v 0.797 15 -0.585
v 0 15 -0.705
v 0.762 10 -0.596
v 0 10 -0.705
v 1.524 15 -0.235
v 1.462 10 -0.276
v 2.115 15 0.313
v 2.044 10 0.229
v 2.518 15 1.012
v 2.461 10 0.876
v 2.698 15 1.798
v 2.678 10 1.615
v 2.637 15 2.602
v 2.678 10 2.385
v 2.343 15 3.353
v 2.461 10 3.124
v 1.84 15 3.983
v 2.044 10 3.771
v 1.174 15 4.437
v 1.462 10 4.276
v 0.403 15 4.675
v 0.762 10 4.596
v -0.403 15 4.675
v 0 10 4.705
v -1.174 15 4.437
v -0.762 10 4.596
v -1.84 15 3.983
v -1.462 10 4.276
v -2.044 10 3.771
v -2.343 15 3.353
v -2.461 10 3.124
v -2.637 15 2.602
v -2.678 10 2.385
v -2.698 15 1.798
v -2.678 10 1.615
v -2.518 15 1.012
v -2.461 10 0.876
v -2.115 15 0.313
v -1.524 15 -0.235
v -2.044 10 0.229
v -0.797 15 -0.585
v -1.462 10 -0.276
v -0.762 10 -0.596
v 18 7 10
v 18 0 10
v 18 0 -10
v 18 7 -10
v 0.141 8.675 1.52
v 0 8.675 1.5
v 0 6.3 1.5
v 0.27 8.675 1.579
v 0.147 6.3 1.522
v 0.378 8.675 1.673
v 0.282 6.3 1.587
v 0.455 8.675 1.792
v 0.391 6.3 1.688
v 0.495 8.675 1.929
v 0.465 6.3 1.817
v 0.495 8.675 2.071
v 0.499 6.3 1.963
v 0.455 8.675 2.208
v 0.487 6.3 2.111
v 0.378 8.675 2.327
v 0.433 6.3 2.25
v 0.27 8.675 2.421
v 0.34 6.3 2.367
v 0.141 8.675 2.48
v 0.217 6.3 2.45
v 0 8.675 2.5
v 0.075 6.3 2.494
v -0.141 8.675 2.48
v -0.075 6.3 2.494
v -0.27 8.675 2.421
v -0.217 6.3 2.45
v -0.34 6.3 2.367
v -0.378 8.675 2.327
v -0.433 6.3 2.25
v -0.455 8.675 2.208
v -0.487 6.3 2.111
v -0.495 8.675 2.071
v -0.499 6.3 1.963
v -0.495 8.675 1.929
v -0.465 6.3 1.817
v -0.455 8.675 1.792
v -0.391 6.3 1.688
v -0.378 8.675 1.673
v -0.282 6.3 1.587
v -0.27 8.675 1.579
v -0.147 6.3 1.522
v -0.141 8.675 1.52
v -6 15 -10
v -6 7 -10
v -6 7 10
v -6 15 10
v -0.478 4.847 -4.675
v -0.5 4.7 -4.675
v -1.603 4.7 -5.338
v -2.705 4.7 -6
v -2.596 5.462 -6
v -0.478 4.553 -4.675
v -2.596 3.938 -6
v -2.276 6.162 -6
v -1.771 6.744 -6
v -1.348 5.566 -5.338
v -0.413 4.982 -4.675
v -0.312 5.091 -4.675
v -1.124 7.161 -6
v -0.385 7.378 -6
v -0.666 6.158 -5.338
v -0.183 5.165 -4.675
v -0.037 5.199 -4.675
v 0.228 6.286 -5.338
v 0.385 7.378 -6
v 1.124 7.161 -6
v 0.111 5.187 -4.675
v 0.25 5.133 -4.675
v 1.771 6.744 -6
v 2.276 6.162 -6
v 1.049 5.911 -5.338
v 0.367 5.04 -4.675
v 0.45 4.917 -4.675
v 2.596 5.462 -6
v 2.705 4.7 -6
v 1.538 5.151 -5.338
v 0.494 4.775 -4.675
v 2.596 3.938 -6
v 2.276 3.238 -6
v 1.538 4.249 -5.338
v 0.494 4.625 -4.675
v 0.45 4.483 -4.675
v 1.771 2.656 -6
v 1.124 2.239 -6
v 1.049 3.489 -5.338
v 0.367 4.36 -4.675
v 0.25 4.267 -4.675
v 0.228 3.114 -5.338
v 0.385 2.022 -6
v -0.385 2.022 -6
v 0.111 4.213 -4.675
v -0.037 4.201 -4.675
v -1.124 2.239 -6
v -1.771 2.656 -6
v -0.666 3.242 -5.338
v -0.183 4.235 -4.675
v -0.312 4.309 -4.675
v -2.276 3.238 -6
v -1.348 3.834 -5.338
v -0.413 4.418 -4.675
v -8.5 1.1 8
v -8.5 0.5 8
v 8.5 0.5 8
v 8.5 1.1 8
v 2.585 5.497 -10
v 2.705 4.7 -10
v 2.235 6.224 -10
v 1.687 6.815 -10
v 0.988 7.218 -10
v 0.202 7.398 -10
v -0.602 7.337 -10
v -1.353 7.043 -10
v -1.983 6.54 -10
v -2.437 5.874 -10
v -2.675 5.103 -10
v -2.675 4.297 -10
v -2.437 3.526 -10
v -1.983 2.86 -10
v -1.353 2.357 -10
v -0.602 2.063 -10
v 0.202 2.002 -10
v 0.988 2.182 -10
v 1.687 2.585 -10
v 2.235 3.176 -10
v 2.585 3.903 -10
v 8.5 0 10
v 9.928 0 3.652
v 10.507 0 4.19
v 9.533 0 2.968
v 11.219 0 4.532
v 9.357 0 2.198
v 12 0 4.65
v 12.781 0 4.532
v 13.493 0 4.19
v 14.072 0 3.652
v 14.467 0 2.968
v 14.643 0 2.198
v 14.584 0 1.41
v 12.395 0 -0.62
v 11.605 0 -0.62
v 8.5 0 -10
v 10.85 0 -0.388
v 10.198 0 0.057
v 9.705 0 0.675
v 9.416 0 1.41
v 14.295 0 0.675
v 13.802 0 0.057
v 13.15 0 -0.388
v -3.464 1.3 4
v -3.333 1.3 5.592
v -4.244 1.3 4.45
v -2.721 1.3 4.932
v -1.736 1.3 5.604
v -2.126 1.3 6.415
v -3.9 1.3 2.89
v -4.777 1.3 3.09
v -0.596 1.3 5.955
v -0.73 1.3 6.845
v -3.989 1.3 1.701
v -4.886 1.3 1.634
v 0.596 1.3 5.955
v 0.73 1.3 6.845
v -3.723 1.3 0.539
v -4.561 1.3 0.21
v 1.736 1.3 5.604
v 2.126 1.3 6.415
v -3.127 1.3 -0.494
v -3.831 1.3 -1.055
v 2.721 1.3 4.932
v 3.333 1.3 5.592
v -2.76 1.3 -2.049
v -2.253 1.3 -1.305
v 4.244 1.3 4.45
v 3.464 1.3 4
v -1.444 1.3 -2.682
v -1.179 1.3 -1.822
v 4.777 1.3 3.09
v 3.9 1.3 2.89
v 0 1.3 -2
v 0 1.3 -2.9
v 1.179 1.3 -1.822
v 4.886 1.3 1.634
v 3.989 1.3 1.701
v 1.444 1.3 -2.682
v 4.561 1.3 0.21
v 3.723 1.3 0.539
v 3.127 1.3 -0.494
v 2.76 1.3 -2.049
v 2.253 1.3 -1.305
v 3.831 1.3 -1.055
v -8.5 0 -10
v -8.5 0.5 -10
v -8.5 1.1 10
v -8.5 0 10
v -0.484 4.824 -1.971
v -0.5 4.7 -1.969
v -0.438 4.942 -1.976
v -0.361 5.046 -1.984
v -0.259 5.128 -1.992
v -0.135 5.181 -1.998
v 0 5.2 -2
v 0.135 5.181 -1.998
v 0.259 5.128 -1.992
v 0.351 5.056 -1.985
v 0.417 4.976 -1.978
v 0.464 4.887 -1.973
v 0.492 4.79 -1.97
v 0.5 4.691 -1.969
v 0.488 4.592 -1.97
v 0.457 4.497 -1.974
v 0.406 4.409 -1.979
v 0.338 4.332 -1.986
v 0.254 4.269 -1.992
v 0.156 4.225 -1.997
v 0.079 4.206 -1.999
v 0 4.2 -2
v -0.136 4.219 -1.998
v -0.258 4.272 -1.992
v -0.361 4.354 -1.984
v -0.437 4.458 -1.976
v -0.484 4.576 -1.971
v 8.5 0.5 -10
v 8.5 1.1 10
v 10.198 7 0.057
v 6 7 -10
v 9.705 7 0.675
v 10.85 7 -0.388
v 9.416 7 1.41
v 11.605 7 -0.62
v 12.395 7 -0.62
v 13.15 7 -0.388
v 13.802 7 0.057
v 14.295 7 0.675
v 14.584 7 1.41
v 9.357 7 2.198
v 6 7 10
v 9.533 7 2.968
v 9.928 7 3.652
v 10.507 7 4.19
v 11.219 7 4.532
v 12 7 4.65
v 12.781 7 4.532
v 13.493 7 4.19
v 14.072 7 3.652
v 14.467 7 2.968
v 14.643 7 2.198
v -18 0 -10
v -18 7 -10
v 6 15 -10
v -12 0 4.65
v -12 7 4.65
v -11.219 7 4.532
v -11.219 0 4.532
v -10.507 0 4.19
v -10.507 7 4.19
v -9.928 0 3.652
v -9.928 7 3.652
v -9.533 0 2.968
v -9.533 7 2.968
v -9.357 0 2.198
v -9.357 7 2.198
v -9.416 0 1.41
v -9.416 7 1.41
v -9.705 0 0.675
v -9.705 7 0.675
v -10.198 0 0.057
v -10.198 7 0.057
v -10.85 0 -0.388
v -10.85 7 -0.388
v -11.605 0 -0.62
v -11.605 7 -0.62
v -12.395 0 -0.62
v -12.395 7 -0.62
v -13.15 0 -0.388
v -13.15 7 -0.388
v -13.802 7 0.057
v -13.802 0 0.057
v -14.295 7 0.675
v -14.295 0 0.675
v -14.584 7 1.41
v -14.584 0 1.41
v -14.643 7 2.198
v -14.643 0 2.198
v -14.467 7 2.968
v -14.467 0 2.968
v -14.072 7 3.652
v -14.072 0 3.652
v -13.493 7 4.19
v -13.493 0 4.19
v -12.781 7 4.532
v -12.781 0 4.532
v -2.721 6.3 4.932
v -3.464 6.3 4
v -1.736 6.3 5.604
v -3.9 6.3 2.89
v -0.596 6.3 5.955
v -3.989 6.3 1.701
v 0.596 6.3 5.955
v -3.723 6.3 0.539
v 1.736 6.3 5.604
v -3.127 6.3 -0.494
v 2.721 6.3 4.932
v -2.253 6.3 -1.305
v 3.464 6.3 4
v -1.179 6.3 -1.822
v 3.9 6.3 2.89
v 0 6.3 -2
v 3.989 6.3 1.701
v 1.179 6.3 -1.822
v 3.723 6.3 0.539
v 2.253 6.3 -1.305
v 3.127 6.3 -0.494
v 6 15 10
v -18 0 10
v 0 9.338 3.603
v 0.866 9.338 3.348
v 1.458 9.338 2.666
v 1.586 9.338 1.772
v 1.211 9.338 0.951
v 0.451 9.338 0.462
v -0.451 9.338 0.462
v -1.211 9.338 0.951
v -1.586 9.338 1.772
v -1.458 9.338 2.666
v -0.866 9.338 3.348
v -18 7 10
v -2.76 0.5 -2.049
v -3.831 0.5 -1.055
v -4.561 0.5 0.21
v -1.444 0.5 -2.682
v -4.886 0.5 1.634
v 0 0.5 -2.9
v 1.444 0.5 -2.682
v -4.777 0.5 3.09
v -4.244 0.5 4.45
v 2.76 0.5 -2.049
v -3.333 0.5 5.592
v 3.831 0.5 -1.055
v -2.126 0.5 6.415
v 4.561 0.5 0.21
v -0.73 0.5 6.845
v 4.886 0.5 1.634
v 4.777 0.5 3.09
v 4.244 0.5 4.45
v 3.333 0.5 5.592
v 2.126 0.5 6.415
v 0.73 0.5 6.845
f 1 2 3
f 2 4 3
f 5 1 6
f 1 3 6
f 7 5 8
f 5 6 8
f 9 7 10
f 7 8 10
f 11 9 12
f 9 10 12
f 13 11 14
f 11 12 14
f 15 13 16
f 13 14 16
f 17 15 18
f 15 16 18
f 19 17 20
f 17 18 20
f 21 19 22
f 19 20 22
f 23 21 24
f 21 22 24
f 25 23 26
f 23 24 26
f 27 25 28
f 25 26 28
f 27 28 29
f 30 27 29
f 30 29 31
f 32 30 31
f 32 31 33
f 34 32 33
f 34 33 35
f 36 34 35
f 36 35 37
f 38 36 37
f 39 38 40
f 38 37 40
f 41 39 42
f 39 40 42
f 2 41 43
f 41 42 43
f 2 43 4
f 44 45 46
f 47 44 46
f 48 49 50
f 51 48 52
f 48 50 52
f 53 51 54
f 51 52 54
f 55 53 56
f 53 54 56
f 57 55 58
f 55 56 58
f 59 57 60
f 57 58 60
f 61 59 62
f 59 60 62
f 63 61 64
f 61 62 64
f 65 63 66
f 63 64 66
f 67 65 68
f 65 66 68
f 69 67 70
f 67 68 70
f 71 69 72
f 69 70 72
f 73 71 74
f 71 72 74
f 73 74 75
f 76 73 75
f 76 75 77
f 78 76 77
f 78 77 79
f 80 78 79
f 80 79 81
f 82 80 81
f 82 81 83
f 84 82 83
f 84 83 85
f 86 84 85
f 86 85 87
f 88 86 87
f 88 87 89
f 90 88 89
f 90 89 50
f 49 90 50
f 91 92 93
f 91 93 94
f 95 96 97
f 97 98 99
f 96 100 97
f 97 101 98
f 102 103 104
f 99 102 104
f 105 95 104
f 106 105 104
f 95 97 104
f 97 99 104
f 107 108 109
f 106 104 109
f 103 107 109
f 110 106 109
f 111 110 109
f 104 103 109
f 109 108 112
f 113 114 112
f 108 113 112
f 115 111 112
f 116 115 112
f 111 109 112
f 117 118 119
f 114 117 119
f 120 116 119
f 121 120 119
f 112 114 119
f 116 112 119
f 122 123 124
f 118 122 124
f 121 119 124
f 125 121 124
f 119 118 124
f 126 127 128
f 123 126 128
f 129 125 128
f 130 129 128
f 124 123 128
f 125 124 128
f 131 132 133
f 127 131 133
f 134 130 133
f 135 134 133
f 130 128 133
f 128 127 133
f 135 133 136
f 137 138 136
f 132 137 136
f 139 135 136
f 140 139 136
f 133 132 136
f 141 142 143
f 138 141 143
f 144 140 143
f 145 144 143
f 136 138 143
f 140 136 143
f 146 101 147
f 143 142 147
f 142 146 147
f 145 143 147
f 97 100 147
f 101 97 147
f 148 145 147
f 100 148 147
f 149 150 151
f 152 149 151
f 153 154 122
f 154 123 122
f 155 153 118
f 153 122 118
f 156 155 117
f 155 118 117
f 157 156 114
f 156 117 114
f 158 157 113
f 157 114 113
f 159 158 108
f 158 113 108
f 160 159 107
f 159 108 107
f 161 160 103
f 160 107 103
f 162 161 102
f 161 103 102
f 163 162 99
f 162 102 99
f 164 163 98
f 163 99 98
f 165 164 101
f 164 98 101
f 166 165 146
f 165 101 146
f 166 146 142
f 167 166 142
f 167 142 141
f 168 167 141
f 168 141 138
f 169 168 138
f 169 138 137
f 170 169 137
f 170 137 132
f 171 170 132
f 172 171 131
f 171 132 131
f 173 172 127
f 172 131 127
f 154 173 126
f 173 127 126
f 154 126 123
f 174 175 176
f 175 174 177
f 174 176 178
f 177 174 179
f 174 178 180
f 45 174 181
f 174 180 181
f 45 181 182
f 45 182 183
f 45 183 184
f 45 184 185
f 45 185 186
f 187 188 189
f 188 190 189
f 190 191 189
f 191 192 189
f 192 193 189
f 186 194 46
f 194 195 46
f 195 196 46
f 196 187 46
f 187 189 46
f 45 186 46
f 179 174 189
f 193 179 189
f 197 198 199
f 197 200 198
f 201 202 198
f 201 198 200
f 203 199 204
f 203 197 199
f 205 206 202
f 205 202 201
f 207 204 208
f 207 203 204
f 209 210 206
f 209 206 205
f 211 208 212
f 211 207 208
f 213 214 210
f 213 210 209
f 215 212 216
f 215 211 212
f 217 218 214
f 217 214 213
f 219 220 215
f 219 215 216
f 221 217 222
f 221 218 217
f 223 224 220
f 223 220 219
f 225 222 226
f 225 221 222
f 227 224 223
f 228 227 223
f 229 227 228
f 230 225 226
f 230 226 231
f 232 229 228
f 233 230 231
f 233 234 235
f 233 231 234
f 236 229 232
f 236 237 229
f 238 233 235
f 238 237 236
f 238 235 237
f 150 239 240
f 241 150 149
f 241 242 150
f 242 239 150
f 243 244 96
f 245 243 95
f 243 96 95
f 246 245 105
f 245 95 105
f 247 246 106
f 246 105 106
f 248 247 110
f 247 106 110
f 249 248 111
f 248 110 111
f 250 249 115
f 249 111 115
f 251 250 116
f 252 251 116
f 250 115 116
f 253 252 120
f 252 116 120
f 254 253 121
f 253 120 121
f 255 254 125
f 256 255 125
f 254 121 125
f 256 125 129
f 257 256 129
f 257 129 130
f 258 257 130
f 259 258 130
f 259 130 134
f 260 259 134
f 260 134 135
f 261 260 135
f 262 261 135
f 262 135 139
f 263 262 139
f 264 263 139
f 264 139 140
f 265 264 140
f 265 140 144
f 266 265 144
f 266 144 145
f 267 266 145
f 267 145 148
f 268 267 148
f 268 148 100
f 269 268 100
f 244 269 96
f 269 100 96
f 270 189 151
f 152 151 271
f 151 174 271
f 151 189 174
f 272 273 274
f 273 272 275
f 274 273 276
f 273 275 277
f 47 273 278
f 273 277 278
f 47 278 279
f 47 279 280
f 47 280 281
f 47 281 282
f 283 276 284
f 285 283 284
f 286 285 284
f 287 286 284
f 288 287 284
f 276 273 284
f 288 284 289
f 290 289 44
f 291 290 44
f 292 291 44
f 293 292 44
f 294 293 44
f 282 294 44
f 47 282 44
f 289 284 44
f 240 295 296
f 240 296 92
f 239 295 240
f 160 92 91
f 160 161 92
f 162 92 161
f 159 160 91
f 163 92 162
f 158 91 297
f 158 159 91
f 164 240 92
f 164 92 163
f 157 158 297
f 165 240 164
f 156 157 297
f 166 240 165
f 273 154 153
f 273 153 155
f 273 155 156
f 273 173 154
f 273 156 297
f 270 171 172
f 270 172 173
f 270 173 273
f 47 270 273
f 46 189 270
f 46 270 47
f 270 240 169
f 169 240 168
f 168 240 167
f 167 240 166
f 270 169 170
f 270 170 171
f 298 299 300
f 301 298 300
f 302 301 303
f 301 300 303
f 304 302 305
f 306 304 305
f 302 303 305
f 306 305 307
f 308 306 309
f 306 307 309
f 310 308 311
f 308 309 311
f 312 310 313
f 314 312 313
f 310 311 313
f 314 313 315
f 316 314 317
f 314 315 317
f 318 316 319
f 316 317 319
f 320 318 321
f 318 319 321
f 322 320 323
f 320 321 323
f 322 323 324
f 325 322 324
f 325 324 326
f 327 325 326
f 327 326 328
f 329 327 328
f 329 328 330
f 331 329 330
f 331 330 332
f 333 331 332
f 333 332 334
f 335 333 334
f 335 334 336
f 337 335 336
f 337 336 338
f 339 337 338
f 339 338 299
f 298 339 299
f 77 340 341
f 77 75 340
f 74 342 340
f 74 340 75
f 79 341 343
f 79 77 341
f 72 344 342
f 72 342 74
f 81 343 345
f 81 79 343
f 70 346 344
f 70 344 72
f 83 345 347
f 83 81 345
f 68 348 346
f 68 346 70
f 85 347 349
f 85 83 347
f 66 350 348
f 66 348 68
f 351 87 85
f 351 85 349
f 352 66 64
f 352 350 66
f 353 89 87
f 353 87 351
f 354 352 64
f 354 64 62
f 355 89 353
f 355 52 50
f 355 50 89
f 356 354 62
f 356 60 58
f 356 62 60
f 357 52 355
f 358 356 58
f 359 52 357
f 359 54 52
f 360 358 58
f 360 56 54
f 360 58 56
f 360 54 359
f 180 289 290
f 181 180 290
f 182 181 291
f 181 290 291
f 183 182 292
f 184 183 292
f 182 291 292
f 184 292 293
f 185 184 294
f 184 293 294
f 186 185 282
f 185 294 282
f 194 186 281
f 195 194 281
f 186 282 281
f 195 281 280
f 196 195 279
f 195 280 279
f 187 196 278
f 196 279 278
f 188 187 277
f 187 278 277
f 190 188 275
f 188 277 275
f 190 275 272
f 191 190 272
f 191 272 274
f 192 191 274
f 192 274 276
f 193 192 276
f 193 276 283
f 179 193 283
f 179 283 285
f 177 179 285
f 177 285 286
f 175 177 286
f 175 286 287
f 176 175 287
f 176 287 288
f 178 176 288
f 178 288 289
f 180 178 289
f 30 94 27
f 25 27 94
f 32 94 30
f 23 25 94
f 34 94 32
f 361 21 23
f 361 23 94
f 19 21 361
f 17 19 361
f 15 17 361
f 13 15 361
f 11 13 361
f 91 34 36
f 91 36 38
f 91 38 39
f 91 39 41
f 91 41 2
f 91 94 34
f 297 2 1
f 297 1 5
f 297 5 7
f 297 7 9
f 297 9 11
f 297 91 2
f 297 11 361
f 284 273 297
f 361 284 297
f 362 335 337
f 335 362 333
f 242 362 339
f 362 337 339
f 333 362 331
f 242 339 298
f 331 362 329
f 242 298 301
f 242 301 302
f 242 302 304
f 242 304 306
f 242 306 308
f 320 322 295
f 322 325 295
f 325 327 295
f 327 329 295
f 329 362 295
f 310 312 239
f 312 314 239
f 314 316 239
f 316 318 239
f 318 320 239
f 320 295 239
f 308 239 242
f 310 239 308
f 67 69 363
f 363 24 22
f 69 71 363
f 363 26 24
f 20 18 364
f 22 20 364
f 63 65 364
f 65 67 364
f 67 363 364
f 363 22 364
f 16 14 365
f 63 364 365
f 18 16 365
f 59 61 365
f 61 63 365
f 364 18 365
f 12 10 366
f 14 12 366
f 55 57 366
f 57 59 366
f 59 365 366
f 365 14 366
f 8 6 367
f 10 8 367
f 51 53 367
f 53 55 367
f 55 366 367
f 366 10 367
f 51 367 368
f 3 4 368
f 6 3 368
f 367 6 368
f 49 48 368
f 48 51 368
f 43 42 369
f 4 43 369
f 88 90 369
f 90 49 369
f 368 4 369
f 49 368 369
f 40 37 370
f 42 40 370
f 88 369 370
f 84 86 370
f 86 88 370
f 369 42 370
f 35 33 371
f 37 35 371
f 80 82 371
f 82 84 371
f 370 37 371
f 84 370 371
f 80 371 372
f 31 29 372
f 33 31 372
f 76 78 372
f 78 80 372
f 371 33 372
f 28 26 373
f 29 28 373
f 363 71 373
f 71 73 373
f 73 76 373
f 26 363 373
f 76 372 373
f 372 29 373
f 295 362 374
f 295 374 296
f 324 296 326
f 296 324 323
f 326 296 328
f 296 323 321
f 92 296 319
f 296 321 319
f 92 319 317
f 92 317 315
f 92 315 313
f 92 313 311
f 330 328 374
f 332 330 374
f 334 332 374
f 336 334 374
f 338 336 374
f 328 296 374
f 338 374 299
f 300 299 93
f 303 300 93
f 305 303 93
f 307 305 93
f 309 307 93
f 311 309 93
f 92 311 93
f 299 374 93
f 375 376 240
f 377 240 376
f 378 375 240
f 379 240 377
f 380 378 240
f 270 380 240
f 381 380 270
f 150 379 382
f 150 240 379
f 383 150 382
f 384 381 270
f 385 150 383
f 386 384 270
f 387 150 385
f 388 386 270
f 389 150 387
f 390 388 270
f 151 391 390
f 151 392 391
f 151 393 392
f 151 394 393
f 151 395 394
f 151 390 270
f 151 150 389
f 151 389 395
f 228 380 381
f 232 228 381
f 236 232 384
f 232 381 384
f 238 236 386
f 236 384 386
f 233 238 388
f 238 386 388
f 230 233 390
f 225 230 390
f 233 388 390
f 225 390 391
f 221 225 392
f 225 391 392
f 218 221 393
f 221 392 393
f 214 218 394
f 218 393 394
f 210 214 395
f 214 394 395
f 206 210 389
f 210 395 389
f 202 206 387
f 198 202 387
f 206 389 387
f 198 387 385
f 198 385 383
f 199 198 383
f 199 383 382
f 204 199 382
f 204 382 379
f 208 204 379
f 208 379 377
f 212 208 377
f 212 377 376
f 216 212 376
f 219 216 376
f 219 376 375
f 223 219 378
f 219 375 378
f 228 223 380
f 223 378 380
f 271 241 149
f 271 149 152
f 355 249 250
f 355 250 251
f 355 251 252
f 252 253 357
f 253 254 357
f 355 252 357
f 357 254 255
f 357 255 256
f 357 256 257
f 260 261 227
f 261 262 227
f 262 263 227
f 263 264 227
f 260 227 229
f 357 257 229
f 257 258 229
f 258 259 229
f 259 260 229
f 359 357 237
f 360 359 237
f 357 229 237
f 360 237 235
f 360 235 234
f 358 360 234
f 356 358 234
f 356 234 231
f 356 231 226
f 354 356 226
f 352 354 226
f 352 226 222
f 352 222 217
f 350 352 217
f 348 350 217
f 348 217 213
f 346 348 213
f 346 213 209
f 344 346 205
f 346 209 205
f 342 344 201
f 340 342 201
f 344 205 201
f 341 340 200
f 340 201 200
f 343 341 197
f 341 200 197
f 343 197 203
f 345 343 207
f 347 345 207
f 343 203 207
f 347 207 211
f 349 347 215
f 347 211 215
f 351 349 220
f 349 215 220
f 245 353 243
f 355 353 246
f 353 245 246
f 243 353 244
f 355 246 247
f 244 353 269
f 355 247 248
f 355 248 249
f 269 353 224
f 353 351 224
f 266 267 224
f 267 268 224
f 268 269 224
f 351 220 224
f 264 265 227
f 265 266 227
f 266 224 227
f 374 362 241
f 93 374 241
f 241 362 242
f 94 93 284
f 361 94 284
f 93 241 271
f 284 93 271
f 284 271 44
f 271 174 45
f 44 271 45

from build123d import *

# Parameters (mm, degrees)
SKETCH_1_W                 = 36
SKETCH_1_H                 = 20
EXTRUDE_1_DEPTH            = 15
SKETCH_2_R                 = 2.65
CUT_EXTRUDE_1_DEPTH        = 26.475478406
SKETCH_3_W                 = 12
SKETCH_3_H                 = 8
CUT_EXTRUDE_2_DEPTH        = 31.805843601
SKETCH_5_W                 = 17
SKETCH_5_H                 = 0.5
CUT_EXTRUDE_3_DEPTH        = 31.805843601
SKETCH_6_W                 = 17
SKETCH_6_H                 = 2
CUT_EXTRUDE_4_DEPTH        = 0.6
SKETCH_7_R                 = 4.9
CUT_EXTRUDE_5_DEPTH        = 0.8
SKETCH_8_R                 = 4
CUT_EXTRUDE_6_DEPTH        = 5
HOLE_WIZARD_1_4_28_1_D     = 5.4102
HOLE_WIZARD_1_4_28_1_DEPTH = 5
HOLE_WIZARD_1_4_28_1_TIP   = 1.625388061
SKETCH_11_R                = 0.5
CUT_EXTRUDE_7_DEPTH        = 23.35374689
HOLE_WIZARD_1_4_28_3_D     = 5.4102
HOLE_WIZARD_1_4_28_3_DEPTH = 4
HOLE_WIZARD_1_4_28_3_TIP   = 1.625388061
SKETCH_16_R                = 0.5
CUT_EXTRUDE_8_DEPTH        = 10


with BuildPart() as part:
    # 草图1 → 凸台-拉伸1 (new body)
    with BuildSketch(Plane(origin=(0, 0, 0), x_dir=(1, 0, 0), z_dir=(0, 1, 0))):
        Rectangle(SKETCH_1_W, SKETCH_1_H)
    extrude(amount=EXTRUDE_1_DEPTH)

    # 草图2 → 切除-拉伸1 (cut, through all)
    with BuildSketch(Plane(origin=(0, 15, 0), x_dir=(1, 0, 0), z_dir=(0, 1, 0))):
        with Locations(Location((-12, -2, 0), (0, 0, 270))):
            Circle(SKETCH_2_R)
        with Locations(Location((12, -2, 0), (0, 0, 270))):
            Circle(SKETCH_2_R)
    extrude(amount=-CUT_EXTRUDE_1_DEPTH, mode=Mode.SUBTRACT)

    # 草图3 → 切除-拉伸2 (cut, through all)
    with BuildSketch(Plane.XY.offset(10)):
        with Locations((-12, 11)):
            Rectangle(SKETCH_3_W, SKETCH_3_H)
        with Locations((12, 11)):
            Rectangle(SKETCH_3_W, SKETCH_3_H)
    extrude(amount=-CUT_EXTRUDE_2_DEPTH, mode=Mode.SUBTRACT)

    # 草图5 → 切除-拉伸3 (cut, through all)
    with BuildSketch(Plane.XY.offset(10)):
        with Locations((0, 0.25)):
            Rectangle(SKETCH_5_W, SKETCH_5_H)
    extrude(amount=-CUT_EXTRUDE_3_DEPTH, mode=Mode.SUBTRACT)

    # 草图6 → 切除-拉伸4 (cut)
    with BuildSketch(Plane.XZ.offset(-0.5)):
        with Locations((0, 9)):
            Rectangle(SKETCH_6_W, SKETCH_6_H)
    extrude(amount=-CUT_EXTRUDE_4_DEPTH, mode=Mode.SUBTRACT)

    # 草图7 → 切除-拉伸5 (cut)
    with BuildSketch(Plane.XZ.offset(-0.5)):
        with Locations(Location((0, 2, 0), (0, 0, 270))):
            Circle(SKETCH_7_R)
    extrude(amount=-CUT_EXTRUDE_5_DEPTH, mode=Mode.SUBTRACT)

    # 草图8 → 切除-拉伸6 (cut)
    with BuildSketch(Plane.XZ.offset(-1.3)):
        with Locations(Location((0, 2, 0), (0, 0, 270))):
            Circle(SKETCH_8_R)
    extrude(amount=-CUT_EXTRUDE_6_DEPTH, mode=Mode.SUBTRACT)

    # 1/4-28 螺纹孔1
    with Locations(Plane(origin=(0, 15, 2), x_dir=(0, 0, 1), z_dir=(0, 1, 0))):
        with Locations((0, 0)):
            Hole(HOLE_WIZARD_1_4_28_1_D / 2, depth=HOLE_WIZARD_1_4_28_1_DEPTH)
            with Locations((0, 0, -(HOLE_WIZARD_1_4_28_1_DEPTH + HOLE_WIZARD_1_4_28_1_TIP / 2))):  # 118° drill point
                Cone(0, HOLE_WIZARD_1_4_28_1_D / 2, HOLE_WIZARD_1_4_28_1_TIP, mode=Mode.SUBTRACT)

    # 草图11 → 切除-拉伸7 (cut, through all)
    with BuildSketch(Plane.XZ.offset(-6.3)):
        with Locations(Location((0, 2, 0), (0, 0, 270))):
            Circle(SKETCH_11_R)
    extrude(amount=-CUT_EXTRUDE_7_DEPTH, mode=Mode.SUBTRACT)

    # 1/4-28 螺纹孔3
    with Locations(Plane(origin=(0, 4.7, -10), x_dir=(-1, 0, 0), z_dir=(0, 0, -1))):
        with Locations((0, 0)):
            Hole(HOLE_WIZARD_1_4_28_3_D / 2, depth=HOLE_WIZARD_1_4_28_3_DEPTH)
            with Locations((0, 0, -(HOLE_WIZARD_1_4_28_3_DEPTH + HOLE_WIZARD_1_4_28_3_TIP / 2))):  # 118° drill point
                Cone(0, HOLE_WIZARD_1_4_28_3_D / 2, HOLE_WIZARD_1_4_28_3_TIP, mode=Mode.SUBTRACT)

    # 草图16 → 切除-拉伸8 (cut)
    with BuildSketch(Plane(origin=(0, 0, -10), x_dir=(-1, 0, 0), z_dir=(0, 0, -1))):
        with Locations((0, 4.7)):
            Circle(SKETCH_16_R)
    extrude(amount=-CUT_EXTRUDE_8_DEPTH, mode=Mode.SUBTRACT)


solid = part.part
